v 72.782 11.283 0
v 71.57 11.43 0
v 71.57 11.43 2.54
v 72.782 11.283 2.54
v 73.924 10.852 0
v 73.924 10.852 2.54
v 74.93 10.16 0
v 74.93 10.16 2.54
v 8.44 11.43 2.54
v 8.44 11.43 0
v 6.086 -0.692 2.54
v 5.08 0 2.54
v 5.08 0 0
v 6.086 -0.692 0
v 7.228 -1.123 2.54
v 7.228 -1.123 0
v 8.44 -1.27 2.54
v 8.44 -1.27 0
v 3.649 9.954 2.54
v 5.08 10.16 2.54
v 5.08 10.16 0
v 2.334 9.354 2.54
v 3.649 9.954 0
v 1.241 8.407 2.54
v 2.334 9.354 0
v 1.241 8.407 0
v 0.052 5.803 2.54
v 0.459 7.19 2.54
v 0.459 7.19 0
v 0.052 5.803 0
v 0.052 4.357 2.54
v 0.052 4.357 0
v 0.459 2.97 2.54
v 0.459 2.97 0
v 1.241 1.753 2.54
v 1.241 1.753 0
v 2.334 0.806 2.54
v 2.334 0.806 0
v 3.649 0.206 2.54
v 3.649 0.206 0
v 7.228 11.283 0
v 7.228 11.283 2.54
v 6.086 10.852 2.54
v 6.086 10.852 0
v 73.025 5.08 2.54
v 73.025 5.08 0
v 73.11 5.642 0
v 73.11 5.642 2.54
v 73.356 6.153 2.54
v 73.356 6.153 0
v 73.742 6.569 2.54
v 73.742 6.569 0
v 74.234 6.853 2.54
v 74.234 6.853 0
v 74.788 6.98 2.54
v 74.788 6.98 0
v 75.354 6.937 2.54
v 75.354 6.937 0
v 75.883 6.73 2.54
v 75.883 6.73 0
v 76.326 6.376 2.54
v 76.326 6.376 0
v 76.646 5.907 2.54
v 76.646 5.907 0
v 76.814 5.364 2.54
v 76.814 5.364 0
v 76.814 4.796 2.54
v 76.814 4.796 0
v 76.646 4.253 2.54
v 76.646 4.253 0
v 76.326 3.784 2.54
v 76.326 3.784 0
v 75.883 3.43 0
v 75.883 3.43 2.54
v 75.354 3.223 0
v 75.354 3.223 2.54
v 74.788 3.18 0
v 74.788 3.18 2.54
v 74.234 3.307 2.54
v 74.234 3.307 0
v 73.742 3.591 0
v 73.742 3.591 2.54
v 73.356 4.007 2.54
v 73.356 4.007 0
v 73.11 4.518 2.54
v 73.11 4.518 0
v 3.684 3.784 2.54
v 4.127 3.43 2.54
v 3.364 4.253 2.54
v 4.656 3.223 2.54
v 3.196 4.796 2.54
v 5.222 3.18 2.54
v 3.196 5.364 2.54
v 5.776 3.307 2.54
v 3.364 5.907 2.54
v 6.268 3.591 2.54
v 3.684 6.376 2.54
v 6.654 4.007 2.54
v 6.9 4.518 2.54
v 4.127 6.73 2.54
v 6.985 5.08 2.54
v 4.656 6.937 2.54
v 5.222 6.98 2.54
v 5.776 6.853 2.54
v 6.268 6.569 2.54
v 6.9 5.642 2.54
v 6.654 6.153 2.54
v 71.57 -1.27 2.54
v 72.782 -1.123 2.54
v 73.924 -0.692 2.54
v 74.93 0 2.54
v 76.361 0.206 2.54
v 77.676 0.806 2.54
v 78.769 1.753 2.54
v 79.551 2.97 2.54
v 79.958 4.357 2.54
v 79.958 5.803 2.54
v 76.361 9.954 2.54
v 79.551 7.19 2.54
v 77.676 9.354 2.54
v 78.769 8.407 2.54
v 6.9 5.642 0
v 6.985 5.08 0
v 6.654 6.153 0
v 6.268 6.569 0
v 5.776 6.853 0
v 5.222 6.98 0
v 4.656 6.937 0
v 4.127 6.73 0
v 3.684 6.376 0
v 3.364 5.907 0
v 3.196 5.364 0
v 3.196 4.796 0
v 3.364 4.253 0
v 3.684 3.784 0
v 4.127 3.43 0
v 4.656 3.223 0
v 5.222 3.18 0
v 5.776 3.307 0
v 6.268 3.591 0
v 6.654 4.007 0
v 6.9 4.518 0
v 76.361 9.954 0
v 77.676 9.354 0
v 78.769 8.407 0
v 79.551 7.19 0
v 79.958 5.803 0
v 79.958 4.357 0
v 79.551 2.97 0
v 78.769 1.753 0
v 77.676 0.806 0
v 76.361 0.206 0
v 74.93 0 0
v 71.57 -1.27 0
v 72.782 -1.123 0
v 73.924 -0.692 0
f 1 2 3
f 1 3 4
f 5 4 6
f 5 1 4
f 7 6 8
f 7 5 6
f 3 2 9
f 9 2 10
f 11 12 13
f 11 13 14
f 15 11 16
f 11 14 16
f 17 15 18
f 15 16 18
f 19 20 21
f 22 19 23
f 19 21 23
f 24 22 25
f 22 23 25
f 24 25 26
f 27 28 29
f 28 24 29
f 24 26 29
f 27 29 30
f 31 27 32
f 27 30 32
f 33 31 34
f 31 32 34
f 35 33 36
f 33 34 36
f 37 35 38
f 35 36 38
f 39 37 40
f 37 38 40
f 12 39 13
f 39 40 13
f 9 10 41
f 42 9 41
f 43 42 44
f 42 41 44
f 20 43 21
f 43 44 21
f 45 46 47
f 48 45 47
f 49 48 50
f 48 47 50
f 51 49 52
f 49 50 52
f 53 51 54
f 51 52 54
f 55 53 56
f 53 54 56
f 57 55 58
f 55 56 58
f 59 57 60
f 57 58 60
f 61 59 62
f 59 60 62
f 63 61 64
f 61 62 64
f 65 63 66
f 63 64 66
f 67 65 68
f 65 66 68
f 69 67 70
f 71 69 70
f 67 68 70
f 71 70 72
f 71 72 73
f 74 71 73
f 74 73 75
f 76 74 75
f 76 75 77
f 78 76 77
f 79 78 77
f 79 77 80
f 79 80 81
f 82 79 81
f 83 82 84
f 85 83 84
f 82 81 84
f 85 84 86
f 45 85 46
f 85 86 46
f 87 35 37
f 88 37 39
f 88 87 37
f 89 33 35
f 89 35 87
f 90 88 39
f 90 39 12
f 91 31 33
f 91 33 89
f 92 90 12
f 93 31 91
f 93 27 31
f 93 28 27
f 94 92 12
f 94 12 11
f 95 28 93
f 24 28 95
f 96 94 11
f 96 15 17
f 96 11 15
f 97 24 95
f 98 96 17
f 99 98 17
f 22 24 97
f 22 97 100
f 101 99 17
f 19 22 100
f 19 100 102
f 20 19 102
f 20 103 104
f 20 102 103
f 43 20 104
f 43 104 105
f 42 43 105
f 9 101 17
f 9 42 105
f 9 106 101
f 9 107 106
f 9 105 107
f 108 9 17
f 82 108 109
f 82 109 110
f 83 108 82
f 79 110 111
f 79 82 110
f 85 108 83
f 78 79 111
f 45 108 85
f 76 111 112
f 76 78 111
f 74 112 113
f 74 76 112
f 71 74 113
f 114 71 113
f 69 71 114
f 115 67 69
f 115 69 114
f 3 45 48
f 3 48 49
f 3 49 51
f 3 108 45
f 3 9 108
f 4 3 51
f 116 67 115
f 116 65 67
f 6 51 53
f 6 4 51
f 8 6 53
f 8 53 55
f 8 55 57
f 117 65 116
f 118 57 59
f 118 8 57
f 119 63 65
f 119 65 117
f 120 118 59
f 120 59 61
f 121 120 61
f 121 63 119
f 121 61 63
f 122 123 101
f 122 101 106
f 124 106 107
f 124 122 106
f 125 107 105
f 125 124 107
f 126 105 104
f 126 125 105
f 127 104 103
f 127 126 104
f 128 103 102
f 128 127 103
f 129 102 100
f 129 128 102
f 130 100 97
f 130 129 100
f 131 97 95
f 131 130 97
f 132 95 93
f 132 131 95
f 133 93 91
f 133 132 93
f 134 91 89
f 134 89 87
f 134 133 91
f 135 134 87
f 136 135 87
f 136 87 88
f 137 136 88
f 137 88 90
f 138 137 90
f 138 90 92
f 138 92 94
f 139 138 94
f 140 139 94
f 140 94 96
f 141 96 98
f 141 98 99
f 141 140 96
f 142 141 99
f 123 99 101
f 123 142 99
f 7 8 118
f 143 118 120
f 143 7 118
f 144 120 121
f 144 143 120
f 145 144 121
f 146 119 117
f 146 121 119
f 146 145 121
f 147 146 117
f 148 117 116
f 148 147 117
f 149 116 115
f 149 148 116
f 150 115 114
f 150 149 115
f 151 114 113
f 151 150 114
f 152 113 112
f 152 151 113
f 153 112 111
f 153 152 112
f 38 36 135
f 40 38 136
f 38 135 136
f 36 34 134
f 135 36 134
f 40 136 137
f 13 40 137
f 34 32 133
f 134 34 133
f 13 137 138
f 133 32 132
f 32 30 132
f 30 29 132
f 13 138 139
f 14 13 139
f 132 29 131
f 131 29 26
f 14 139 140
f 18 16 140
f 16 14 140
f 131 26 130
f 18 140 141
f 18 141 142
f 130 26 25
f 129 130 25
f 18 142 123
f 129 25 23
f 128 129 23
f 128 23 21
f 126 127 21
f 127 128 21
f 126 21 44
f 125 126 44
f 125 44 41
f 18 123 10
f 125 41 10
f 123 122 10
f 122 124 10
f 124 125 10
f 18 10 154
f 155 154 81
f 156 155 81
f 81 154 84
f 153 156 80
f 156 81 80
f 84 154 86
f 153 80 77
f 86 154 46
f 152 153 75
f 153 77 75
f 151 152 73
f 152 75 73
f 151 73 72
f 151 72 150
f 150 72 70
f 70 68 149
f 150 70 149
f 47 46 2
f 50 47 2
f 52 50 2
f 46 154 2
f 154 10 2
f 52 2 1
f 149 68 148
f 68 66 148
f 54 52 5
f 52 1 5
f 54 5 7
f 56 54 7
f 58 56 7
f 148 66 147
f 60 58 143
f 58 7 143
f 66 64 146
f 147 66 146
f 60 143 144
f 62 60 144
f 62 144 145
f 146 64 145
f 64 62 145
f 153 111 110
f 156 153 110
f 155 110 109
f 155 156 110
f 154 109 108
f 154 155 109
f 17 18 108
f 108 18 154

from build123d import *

# Parameters (mm, degrees)
SKETCH1_R           = 1.905
BOSS_EXTRUDE1_DEPTH = 2.54
FILLET7_R           = 5.08


with BuildPart() as part:
    # Sketch1 → Boss-Extrude1 (new body)
    with BuildSketch(Plane.XY):
        Polygon((5.08, 10.16), (6.35, 11.43), (40.005, 11.43), (40.005, -1.27), (6.35, -1.27), (5.08, 0), (0, 0), (0, 10.16), align=None)
        with Locations((5.08, 5.08)):
            Circle(SKETCH1_R, mode=Mode.SUBTRACT)
    extrude(amount=BOSS_EXTRUDE1_DEPTH)

    # Fillet7
    # the kernel refuses this fillet: 5.08 mm, written as the material it takes off along each edge
    with BuildSketch(Plane(origin=(6.35, -1.27, -5.225260413), x_dir=(1, 0, 0), z_dir=(0, 0, 1))) as fillet7_piece_1:
        with BuildLine():
            CenterArc((2.090104165, 5.08), FILLET7_R, 228.590377891, 41.409622109)
            Line((-1.27, 1.27), (-1.337202083, 1.1938))
            ThreePointArc((-1.337202083, 1.1938), (-0.706842049, 0.563157951), (-0.071842049, -0.071842049))
            Line((-0.071842049, -0.071842049), (0, -0.1016))
            Line((0, -0.1016), (2.090104165, -0.1016))
            Line((2.090104165, -0.1016), (2.090104165, 0))
        make_face()
    extrude(amount=12.990520825, mode=Mode.SUBTRACT)
    with BuildSketch(Plane(origin=(6.35, 11.43, -5.225260413), x_dir=(-0.7071067811865464, -0.7071067811865488, 0), z_dir=(0, 0, 1))) as fillet7_piece_2:
        with BuildLine():
            CenterArc((2.11417562, 5.070029277), FILLET7_R, 225, 41.409622109)
            Line((-1.477926828, 1.477926828), (-1.549768877, 1.40608478))
            Line((-1.549768877, 1.40608478), (-0.071842049, -0.071842049))
            Line((-0.071842049, -0.071842049), (0, -0.1016))
            ThreePointArc((0, -0.1016), (0.898025612, -0.1016), (1.789688736, -0.101400586))
            Line((1.789688736, -0.101400586), (1.796051224, 0))
        make_face()
    extrude(amount=12.990520825, mode=Mode.SUBTRACT)
    with BuildSketch(Plane(origin=(0, 0, -12.7), x_dir=(1, 0, 0), z_dir=(0, 0, 1)), Plane(origin=(0, 10.16, -12.7), x_dir=(0, -1, 0), z_dir=(0, 0, 1))) as fillet7_piece_3:
        with BuildLine():
            CenterArc((FILLET7_R, FILLET7_R), FILLET7_R, 180, 90)
            Line((0, FILLET7_R), (-FILLET7_R * 0.02, FILLET7_R))
            Line((-FILLET7_R * 0.02, FILLET7_R), (-FILLET7_R * 0.02, -FILLET7_R * 0.02))
            Line((-FILLET7_R * 0.02, -FILLET7_R * 0.02), (FILLET7_R, -FILLET7_R * 0.02))
            Line((FILLET7_R, -FILLET7_R * 0.02), (FILLET7_R, 0))
        make_face()
    extrude(amount=27.94, mode=Mode.SUBTRACT)

    # Mirror7: part across plane


with BuildPart() as part_1:
    add(part.part)
    add(part.part.mirror(Plane(origin=(40.005, -1.27, 2.54), x_dir=(0, 0, 1), z_dir=(-1, 0, 0))))


solid = part_1.part
